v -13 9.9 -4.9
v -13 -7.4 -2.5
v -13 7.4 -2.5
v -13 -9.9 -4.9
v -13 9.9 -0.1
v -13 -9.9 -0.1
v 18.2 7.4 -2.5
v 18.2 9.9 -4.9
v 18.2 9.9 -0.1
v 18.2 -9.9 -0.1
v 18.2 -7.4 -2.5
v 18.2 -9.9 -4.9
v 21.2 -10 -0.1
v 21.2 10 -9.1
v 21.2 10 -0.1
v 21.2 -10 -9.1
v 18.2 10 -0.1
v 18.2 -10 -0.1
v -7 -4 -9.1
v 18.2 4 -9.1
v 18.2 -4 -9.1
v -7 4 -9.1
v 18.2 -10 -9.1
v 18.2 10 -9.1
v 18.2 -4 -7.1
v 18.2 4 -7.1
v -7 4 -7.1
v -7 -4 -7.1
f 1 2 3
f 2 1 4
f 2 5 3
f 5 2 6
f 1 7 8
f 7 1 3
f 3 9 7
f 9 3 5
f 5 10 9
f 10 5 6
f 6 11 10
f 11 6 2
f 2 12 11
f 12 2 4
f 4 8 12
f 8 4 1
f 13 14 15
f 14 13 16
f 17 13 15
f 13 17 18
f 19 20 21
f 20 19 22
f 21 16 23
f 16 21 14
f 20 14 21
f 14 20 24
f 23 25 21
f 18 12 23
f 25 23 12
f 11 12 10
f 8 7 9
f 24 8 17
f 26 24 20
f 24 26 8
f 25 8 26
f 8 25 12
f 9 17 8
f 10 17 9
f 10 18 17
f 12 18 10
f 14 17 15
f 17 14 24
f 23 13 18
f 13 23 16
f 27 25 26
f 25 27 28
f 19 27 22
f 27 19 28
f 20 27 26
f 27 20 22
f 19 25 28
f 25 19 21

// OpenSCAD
// file: utilities.scad
//utilities.scad contains code that common functions that are reusable across files

module keyway(width, height, waist, depth){
    // keyway is code to handle making a keyway to easily switch out addons

    rotate(a = 90, v = [0, 1, 0]){
        linear_extrude(height = depth, center = true)
        polygon(points = [
                [-width/2, -height/2],
                [0, -waist/2],
                [width/2, -height/2],
                [width/2, height/2],
                [0, waist/2],
                [-width/2, height/2]]
        );
    }
}
// main file
$tolerence = 0.2; //Tolerence for mounting parts

//include <stethoscope_addon_mount.scad>;
use <utilities.scad>;

translate([3, 0, -5/2]) {
   keyway(5 - $tolerence, 20 - $tolerence, 15 - $tolerence, 29 + 3);
}

// cube that hangs over the mount
translate([19.5 + $tolerence, 0, -4.5 - $tolerence/2]) {
   cube([3, 20, 9], center = true);
}

// cube that extends down for the microphone
translate([6, 0, -8 - $tolerence/2]) {
   cube([26, 8, 2], center = true);
}
